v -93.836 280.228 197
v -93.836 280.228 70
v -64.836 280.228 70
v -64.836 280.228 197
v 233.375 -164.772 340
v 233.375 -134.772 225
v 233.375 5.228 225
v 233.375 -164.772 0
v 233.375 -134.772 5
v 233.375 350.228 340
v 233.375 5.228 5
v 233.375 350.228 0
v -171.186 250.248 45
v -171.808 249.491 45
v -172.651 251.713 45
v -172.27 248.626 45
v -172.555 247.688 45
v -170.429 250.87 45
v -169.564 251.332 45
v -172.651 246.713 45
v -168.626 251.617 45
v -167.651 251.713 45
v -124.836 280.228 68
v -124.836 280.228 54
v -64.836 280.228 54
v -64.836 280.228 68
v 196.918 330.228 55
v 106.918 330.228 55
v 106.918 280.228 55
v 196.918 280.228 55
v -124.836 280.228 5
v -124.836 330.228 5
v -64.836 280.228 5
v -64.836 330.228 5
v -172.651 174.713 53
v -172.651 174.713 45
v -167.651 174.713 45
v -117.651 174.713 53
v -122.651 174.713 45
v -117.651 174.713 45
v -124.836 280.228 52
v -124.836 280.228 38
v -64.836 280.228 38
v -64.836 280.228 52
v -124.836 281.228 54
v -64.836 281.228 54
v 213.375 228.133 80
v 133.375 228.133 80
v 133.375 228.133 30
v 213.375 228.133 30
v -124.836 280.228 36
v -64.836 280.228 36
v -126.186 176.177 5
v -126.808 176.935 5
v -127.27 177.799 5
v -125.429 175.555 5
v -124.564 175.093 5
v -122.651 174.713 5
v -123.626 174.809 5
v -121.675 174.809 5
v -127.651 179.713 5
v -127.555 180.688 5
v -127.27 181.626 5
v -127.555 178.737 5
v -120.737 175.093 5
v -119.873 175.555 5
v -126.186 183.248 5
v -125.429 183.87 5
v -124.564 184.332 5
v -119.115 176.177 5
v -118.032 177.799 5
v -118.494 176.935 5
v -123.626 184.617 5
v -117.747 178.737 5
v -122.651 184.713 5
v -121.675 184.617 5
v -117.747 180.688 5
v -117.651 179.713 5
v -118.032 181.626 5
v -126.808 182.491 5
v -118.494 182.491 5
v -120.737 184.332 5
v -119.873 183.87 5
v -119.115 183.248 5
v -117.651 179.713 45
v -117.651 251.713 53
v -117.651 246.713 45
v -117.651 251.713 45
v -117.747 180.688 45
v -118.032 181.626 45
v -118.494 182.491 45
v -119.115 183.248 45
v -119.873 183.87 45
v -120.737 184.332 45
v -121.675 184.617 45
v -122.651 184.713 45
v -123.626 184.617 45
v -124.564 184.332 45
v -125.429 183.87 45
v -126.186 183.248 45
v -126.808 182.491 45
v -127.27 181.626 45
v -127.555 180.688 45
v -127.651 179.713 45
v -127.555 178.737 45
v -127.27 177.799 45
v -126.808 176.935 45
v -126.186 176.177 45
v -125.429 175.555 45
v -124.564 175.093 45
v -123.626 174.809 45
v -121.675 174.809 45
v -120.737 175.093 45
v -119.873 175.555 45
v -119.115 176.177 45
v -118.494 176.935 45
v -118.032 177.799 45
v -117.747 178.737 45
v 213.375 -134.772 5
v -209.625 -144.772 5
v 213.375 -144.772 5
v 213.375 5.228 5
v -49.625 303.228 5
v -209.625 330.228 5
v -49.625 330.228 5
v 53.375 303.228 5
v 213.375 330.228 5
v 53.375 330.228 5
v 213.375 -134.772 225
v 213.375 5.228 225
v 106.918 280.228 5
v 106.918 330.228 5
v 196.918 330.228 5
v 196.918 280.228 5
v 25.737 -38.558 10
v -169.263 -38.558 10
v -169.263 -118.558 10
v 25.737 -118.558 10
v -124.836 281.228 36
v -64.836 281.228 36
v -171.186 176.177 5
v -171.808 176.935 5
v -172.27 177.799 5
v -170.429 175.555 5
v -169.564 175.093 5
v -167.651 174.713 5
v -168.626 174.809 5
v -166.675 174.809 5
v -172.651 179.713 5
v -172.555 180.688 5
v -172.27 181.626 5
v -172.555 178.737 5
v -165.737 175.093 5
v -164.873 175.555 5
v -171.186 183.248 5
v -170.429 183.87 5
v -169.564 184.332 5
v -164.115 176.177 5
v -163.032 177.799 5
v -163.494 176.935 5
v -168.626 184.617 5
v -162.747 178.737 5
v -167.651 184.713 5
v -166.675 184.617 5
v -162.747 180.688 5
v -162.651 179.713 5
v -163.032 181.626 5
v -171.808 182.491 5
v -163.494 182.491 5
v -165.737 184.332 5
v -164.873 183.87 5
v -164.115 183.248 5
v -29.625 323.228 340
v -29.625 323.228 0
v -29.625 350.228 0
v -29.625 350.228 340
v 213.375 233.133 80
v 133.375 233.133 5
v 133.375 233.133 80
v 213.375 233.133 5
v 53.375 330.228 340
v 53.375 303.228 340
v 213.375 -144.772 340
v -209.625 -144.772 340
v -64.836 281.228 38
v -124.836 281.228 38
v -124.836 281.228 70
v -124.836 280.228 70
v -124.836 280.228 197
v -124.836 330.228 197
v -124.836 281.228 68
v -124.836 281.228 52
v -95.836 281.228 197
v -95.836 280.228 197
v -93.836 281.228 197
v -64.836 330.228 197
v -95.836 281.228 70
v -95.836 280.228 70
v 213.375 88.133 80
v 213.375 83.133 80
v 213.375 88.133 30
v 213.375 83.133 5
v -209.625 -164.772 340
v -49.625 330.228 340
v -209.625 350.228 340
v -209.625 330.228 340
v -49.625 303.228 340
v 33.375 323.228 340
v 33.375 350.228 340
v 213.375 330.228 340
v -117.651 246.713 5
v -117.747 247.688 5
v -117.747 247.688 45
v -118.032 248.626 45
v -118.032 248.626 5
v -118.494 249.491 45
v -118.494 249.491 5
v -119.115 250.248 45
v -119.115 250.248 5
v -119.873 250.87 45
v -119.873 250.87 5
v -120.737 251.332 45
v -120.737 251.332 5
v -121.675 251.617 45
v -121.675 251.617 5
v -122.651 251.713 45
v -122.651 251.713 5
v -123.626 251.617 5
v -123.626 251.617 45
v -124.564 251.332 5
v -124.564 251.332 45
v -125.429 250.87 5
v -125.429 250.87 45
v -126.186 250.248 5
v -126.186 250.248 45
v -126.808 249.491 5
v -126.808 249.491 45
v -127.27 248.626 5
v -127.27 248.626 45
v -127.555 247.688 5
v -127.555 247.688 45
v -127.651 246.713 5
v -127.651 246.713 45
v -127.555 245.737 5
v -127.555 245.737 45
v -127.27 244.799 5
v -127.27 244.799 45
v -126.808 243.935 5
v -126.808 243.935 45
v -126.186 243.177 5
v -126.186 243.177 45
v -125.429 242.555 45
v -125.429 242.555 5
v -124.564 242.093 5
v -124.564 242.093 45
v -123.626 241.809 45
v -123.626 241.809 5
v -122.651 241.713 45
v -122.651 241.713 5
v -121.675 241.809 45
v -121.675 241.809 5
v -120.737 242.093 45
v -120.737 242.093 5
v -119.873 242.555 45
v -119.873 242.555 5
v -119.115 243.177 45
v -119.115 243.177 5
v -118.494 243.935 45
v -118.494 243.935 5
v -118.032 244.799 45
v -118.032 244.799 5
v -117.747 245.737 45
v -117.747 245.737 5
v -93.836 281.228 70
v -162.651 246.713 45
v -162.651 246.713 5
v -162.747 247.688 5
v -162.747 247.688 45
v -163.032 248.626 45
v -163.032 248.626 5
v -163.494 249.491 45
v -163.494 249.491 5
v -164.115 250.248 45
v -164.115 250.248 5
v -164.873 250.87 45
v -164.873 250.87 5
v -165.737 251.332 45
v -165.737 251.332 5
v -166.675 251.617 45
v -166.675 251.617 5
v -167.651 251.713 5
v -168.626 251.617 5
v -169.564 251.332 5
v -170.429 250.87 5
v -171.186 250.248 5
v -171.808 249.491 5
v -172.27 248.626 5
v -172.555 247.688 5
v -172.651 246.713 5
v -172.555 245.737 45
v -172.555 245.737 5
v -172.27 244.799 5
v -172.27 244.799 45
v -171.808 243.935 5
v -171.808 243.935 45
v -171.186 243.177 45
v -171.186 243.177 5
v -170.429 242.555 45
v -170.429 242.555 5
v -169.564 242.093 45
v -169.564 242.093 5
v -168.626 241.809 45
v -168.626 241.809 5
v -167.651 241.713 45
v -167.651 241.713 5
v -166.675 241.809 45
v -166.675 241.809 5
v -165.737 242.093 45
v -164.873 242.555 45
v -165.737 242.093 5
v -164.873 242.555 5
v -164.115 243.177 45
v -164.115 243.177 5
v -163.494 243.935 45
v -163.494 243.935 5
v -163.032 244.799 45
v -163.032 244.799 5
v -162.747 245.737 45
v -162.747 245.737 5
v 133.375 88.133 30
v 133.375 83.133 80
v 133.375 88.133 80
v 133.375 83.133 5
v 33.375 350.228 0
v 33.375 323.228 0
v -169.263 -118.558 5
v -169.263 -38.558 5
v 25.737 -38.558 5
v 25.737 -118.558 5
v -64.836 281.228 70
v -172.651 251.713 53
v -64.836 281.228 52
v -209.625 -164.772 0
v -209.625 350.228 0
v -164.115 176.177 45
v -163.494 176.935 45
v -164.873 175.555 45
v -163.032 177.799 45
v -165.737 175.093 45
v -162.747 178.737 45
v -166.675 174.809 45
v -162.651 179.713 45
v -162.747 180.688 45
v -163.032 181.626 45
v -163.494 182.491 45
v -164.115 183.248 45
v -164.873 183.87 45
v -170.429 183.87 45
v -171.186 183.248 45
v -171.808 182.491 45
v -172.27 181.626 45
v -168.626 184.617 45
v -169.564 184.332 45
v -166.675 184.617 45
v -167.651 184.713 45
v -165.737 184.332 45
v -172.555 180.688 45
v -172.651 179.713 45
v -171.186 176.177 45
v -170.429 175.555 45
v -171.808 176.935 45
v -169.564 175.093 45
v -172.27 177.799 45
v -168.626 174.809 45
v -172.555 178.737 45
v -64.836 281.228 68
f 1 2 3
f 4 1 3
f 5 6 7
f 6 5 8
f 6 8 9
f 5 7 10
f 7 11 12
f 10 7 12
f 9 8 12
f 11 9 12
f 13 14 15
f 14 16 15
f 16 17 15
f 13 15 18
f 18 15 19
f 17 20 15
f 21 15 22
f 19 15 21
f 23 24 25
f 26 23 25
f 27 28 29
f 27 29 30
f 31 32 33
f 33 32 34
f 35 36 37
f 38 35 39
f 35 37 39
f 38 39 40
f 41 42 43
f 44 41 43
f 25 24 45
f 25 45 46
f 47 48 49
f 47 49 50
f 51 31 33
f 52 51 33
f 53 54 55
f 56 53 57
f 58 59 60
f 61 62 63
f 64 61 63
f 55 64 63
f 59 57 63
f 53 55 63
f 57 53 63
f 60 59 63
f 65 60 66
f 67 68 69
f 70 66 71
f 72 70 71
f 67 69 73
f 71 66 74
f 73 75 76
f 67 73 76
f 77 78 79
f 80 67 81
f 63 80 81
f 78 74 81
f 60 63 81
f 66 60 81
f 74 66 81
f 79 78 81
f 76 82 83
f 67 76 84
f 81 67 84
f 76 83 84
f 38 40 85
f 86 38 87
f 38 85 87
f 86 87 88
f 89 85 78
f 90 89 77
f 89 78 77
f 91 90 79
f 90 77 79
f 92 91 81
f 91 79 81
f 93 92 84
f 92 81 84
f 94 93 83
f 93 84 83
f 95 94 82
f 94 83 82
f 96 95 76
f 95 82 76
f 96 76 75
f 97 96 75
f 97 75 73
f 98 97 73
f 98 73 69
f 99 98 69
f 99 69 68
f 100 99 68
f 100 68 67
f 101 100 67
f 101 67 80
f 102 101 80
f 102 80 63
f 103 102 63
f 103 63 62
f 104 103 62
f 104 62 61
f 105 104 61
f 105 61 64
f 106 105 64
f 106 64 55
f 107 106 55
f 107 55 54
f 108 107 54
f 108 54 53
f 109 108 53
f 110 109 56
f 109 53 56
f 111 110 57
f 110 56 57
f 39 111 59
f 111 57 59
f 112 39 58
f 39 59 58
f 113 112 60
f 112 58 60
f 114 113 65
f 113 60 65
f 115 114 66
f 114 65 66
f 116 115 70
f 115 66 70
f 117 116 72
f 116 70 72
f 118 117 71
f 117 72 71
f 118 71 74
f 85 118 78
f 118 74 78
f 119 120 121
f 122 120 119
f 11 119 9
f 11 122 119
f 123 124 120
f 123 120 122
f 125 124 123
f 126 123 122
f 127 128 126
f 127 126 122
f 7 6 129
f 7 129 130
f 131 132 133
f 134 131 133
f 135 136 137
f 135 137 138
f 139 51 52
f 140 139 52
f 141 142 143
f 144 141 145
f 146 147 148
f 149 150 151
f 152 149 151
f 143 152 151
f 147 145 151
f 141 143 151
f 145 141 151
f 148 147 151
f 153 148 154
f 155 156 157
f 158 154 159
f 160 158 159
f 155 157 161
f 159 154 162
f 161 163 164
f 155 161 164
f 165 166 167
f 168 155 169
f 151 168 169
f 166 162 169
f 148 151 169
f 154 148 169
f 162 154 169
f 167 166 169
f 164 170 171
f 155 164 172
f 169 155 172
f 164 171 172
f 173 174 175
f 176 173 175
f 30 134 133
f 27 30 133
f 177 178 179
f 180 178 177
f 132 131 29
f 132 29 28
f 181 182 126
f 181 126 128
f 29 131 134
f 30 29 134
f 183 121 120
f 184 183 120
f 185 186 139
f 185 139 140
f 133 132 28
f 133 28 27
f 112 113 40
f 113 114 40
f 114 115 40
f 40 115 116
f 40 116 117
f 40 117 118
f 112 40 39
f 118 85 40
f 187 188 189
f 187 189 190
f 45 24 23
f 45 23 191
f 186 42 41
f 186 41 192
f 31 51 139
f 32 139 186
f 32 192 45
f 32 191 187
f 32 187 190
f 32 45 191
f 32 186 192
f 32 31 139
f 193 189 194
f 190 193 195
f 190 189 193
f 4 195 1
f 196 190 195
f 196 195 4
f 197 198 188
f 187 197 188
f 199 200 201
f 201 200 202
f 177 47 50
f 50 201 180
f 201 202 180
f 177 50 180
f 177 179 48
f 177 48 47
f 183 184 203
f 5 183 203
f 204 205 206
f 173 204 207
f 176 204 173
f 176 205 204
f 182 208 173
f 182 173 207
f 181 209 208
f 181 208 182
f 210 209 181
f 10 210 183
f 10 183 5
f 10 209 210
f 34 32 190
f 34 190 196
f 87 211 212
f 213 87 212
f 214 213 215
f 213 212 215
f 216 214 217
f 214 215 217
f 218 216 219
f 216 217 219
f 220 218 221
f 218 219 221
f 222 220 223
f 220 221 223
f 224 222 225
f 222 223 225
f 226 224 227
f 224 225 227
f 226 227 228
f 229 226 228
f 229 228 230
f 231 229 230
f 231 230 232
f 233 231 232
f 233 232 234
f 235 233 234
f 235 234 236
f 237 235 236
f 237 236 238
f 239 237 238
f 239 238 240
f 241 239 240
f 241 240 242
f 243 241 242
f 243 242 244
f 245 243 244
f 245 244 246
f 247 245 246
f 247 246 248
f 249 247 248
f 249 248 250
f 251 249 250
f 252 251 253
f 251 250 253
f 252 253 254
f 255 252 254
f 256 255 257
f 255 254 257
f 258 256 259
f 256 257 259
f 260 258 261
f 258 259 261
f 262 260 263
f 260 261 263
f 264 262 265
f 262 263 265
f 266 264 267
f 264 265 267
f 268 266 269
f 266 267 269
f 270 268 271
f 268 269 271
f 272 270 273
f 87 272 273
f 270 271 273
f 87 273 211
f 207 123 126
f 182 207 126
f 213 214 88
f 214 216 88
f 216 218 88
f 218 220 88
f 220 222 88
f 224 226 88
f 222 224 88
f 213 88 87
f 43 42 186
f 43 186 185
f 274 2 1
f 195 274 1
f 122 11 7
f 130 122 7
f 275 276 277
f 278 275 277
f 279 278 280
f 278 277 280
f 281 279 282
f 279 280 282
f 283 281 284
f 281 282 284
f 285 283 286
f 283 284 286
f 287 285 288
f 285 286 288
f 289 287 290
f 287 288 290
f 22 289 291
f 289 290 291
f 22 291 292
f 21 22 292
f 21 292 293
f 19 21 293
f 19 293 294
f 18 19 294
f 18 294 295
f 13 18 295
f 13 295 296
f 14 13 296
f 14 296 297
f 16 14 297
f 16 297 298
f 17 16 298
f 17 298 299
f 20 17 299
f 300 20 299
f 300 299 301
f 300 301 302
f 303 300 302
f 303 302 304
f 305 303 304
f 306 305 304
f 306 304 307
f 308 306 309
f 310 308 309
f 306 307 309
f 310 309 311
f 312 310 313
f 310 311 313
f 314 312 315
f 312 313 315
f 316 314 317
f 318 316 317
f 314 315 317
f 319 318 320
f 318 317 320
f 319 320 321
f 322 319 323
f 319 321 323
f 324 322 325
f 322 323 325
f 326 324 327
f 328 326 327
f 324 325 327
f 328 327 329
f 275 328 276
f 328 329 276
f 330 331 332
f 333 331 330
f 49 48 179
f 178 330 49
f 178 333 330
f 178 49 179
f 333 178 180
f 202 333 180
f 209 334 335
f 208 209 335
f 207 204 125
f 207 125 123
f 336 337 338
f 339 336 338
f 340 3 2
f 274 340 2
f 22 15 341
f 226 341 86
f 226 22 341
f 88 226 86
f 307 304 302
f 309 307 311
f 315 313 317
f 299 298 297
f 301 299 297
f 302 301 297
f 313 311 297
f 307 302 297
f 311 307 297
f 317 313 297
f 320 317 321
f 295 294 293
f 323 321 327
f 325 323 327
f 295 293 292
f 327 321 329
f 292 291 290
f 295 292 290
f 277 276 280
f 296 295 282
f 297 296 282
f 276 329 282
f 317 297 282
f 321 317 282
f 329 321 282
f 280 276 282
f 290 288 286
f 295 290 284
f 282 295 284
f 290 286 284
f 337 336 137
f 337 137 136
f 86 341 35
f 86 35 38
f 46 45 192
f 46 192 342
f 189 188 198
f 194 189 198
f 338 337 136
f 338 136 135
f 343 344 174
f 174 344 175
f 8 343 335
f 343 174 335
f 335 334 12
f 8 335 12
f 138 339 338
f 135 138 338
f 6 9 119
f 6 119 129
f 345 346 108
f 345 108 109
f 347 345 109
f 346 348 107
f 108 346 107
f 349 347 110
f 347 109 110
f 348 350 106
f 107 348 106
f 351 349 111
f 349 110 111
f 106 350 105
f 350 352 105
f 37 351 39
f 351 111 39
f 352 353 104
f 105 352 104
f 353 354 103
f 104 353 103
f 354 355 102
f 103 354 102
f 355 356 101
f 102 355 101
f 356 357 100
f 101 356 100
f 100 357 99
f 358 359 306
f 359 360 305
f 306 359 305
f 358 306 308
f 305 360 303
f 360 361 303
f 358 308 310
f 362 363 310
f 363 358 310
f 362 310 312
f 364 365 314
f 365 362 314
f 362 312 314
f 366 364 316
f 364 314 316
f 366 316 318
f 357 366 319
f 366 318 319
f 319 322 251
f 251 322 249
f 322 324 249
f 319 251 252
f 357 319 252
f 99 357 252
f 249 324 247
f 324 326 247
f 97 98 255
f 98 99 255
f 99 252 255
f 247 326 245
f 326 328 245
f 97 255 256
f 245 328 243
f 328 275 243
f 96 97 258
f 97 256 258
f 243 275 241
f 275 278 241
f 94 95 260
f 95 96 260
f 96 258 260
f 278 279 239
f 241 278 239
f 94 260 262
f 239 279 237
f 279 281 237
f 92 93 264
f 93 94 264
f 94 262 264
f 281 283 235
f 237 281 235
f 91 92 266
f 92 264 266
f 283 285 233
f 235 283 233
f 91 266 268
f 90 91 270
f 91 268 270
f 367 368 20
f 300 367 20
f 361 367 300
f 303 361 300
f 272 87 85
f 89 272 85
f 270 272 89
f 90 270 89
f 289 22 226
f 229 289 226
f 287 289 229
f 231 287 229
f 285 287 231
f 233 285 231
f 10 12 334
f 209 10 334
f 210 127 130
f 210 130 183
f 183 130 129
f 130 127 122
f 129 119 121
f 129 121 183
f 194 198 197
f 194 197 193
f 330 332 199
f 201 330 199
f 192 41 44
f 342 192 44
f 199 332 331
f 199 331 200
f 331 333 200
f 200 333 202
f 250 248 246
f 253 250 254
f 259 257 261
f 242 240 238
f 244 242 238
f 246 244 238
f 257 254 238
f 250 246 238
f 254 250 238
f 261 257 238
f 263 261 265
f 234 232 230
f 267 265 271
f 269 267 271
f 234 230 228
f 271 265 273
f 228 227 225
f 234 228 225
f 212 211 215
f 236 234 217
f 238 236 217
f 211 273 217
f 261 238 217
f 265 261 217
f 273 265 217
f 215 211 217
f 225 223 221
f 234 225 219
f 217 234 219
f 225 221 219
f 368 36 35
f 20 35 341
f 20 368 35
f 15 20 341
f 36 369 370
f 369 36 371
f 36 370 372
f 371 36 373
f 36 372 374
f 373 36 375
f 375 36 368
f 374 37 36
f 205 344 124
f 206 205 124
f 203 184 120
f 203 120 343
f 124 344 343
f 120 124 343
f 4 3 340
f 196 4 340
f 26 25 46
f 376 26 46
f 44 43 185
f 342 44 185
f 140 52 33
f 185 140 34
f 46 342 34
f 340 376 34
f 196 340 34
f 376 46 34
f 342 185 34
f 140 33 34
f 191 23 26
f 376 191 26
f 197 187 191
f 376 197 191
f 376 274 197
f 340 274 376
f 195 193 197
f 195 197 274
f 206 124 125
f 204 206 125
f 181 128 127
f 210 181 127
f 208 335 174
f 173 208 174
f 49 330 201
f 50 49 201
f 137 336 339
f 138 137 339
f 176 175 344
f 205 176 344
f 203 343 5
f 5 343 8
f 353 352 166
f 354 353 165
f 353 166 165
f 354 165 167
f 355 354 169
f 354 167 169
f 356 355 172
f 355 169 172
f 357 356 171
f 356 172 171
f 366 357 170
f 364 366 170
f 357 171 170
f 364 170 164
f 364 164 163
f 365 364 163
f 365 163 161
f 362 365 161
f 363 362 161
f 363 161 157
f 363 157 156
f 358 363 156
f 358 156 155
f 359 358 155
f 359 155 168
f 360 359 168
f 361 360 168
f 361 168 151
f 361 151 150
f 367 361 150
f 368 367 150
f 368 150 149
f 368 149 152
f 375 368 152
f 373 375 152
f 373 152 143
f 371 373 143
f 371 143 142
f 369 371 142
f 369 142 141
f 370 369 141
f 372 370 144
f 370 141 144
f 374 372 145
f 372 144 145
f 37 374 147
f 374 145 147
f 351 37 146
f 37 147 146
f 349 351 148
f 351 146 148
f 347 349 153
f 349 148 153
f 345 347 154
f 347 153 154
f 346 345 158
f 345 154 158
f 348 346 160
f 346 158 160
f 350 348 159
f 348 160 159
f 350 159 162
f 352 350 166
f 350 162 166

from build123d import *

# Parameters (mm, degrees)
F1_DEPTH  = 340
F2_DEPTH  = 5
F3_W      = 140
F3_H      = 220
F4_DEPTH  = 20
F5_W      = 80
F5_H      = 150
F6_DEPTH  = 75
F7_W      = 80
F7_H      = 140
F8_DEPTH  = 50
F9_W      = 90
F9_H      = 50
F10_DEPTH = 50
F11_W     = 60
F11_H     = 50
F12_DEPTH = 192
F13_W     = 2
F13_H     = 127
F13_W_2   = 60
F13_H_2   = 2
F14_DEPTH = 1
F15_W     = 195
F15_H     = 80
F16_DEPTH = 5
F17_R     = 5
F18_DEPTH = 40
F19_W     = 55
F19_H     = 77
F20_DEPTH = 8


with BuildPart() as f1:
    # F0 (on Top) → F1 (new body)
    with BuildSketch(Plane.XY):
        Polygon((-209.625, 350.22819), (-209.625, 330.2282), (-49.625, 330.2282), (-49.625, 303.2282), (53.375, 303.2282), (53.375, 330.2282), (213.375, 330.2282), (213.375, -144.7718), (-209.625, -144.7718), (-209.625, -164.771791), (233.374991, -164.771791), (233.374991, 350.22819), (33.375009, 350.22819), (33.375009, 323.22819), (-29.625009, 323.22819), (-29.625009, 350.22819), align=None)
    extrude(amount=F1_DEPTH)

    # F0 (on Top) → F2 (join)
    with BuildSketch(Plane.XY):
        Polygon((-49.625, 330.2282), (-209.625, 330.2282), (-209.625, -144.7718), (213.375, -144.7718), (213.375, 330.2282), (53.375, 330.2282), (53.375, 303.2282), (-49.625, 303.2282), align=None)
    extrude(amount=F2_DEPTH)

    # F3 (on face) → F4 (cut)
    with BuildSketch(Plane.YZ.offset(233.374991)):
        with Locations((-64.7718, 115)):
            Rectangle(F3_W, F3_H)
    extrude(amount=-F4_DEPTH, mode=Mode.SUBTRACT)


with BuildPart() as f6:
    # F5 (on face) → F6 (new body)
    with BuildSketch(Plane.XY.offset(5)):
        with Locations((173.375, 158.132865)):
            Rectangle(F5_W, F5_H)
    extrude(amount=F6_DEPTH)

    # F7 (on face) → F8 (cut)
    with BuildSketch(Plane.XY.offset(80)):
        with Locations((173.375, 158.132865)):
            Rectangle(F7_W, F7_H)
    extrude(amount=-F8_DEPTH, mode=Mode.SUBTRACT)


with BuildPart() as f10:
    # F9 (on face) → F10 (new body)
    with BuildSketch(Plane.XY.offset(5)):
        with Locations((151.917549, 305.2282)):
            Rectangle(F9_W, F9_H)
    extrude(amount=F10_DEPTH)


with BuildPart() as f12:
    # F11 (on face) → F12 (new body)
    with BuildSketch(Plane.XY.offset(5)):
        with Locations((-94.835742, 305.2282)):
            Rectangle(F11_W, F11_H)
    extrude(amount=F12_DEPTH)

    # F13 (on face) → F14 (cut)
    with BuildSketch(Plane.XZ.offset(-280.2282)):
        with Locations((-94.835742, 133.5)):
            Rectangle(F13_W, F13_H)
        Polygon((-124.835742, 70), (-124.835742, 68), (-64.835742, 68), (-64.835742, 70), (-93.835742, 70), (-95.835742, 70), align=None)
        with Locations((-94.835742, 53)):
            Rectangle(F13_W_2, F13_H_2)
        with Locations((-94.835742, 37)):
            Rectangle(F13_W_2, F13_H_2)
    extrude(amount=-F14_DEPTH, mode=Mode.SUBTRACT)


with BuildPart() as f16:
    # F15 (on face) → F16 (new body)
    with BuildSketch(Plane.XY.offset(5)):
        with Locations((-71.763179, -78.557897)):
            Rectangle(F15_W, F15_H)
    extrude(amount=F16_DEPTH)


with BuildPart() as f18:
    # F17 (on face) → F18 (new body)
    with BuildSketch(Plane.XY.offset(5)):
        with Locations((-167.650908, 246.712744)):
            Circle(F17_R)
        with Locations((-167.650908, 179.712744)):
            Circle(F17_R)
        with Locations((-122.650908, 246.712744)):
            Circle(F17_R)
        with Locations((-122.650908, 179.712744)):
            Circle(F17_R)
    extrude(amount=F18_DEPTH)

    # F19 (on face) → F20 (join)
    with BuildSketch(Plane.XY.offset(45)):
        with Locations((-145.150908, 213.212744)):
            Rectangle(F19_W, F19_H)
    extrude(amount=F20_DEPTH)


solid = Compound([f1.part, f6.part, f10.part, f12.part, f16.part, f18.part])
